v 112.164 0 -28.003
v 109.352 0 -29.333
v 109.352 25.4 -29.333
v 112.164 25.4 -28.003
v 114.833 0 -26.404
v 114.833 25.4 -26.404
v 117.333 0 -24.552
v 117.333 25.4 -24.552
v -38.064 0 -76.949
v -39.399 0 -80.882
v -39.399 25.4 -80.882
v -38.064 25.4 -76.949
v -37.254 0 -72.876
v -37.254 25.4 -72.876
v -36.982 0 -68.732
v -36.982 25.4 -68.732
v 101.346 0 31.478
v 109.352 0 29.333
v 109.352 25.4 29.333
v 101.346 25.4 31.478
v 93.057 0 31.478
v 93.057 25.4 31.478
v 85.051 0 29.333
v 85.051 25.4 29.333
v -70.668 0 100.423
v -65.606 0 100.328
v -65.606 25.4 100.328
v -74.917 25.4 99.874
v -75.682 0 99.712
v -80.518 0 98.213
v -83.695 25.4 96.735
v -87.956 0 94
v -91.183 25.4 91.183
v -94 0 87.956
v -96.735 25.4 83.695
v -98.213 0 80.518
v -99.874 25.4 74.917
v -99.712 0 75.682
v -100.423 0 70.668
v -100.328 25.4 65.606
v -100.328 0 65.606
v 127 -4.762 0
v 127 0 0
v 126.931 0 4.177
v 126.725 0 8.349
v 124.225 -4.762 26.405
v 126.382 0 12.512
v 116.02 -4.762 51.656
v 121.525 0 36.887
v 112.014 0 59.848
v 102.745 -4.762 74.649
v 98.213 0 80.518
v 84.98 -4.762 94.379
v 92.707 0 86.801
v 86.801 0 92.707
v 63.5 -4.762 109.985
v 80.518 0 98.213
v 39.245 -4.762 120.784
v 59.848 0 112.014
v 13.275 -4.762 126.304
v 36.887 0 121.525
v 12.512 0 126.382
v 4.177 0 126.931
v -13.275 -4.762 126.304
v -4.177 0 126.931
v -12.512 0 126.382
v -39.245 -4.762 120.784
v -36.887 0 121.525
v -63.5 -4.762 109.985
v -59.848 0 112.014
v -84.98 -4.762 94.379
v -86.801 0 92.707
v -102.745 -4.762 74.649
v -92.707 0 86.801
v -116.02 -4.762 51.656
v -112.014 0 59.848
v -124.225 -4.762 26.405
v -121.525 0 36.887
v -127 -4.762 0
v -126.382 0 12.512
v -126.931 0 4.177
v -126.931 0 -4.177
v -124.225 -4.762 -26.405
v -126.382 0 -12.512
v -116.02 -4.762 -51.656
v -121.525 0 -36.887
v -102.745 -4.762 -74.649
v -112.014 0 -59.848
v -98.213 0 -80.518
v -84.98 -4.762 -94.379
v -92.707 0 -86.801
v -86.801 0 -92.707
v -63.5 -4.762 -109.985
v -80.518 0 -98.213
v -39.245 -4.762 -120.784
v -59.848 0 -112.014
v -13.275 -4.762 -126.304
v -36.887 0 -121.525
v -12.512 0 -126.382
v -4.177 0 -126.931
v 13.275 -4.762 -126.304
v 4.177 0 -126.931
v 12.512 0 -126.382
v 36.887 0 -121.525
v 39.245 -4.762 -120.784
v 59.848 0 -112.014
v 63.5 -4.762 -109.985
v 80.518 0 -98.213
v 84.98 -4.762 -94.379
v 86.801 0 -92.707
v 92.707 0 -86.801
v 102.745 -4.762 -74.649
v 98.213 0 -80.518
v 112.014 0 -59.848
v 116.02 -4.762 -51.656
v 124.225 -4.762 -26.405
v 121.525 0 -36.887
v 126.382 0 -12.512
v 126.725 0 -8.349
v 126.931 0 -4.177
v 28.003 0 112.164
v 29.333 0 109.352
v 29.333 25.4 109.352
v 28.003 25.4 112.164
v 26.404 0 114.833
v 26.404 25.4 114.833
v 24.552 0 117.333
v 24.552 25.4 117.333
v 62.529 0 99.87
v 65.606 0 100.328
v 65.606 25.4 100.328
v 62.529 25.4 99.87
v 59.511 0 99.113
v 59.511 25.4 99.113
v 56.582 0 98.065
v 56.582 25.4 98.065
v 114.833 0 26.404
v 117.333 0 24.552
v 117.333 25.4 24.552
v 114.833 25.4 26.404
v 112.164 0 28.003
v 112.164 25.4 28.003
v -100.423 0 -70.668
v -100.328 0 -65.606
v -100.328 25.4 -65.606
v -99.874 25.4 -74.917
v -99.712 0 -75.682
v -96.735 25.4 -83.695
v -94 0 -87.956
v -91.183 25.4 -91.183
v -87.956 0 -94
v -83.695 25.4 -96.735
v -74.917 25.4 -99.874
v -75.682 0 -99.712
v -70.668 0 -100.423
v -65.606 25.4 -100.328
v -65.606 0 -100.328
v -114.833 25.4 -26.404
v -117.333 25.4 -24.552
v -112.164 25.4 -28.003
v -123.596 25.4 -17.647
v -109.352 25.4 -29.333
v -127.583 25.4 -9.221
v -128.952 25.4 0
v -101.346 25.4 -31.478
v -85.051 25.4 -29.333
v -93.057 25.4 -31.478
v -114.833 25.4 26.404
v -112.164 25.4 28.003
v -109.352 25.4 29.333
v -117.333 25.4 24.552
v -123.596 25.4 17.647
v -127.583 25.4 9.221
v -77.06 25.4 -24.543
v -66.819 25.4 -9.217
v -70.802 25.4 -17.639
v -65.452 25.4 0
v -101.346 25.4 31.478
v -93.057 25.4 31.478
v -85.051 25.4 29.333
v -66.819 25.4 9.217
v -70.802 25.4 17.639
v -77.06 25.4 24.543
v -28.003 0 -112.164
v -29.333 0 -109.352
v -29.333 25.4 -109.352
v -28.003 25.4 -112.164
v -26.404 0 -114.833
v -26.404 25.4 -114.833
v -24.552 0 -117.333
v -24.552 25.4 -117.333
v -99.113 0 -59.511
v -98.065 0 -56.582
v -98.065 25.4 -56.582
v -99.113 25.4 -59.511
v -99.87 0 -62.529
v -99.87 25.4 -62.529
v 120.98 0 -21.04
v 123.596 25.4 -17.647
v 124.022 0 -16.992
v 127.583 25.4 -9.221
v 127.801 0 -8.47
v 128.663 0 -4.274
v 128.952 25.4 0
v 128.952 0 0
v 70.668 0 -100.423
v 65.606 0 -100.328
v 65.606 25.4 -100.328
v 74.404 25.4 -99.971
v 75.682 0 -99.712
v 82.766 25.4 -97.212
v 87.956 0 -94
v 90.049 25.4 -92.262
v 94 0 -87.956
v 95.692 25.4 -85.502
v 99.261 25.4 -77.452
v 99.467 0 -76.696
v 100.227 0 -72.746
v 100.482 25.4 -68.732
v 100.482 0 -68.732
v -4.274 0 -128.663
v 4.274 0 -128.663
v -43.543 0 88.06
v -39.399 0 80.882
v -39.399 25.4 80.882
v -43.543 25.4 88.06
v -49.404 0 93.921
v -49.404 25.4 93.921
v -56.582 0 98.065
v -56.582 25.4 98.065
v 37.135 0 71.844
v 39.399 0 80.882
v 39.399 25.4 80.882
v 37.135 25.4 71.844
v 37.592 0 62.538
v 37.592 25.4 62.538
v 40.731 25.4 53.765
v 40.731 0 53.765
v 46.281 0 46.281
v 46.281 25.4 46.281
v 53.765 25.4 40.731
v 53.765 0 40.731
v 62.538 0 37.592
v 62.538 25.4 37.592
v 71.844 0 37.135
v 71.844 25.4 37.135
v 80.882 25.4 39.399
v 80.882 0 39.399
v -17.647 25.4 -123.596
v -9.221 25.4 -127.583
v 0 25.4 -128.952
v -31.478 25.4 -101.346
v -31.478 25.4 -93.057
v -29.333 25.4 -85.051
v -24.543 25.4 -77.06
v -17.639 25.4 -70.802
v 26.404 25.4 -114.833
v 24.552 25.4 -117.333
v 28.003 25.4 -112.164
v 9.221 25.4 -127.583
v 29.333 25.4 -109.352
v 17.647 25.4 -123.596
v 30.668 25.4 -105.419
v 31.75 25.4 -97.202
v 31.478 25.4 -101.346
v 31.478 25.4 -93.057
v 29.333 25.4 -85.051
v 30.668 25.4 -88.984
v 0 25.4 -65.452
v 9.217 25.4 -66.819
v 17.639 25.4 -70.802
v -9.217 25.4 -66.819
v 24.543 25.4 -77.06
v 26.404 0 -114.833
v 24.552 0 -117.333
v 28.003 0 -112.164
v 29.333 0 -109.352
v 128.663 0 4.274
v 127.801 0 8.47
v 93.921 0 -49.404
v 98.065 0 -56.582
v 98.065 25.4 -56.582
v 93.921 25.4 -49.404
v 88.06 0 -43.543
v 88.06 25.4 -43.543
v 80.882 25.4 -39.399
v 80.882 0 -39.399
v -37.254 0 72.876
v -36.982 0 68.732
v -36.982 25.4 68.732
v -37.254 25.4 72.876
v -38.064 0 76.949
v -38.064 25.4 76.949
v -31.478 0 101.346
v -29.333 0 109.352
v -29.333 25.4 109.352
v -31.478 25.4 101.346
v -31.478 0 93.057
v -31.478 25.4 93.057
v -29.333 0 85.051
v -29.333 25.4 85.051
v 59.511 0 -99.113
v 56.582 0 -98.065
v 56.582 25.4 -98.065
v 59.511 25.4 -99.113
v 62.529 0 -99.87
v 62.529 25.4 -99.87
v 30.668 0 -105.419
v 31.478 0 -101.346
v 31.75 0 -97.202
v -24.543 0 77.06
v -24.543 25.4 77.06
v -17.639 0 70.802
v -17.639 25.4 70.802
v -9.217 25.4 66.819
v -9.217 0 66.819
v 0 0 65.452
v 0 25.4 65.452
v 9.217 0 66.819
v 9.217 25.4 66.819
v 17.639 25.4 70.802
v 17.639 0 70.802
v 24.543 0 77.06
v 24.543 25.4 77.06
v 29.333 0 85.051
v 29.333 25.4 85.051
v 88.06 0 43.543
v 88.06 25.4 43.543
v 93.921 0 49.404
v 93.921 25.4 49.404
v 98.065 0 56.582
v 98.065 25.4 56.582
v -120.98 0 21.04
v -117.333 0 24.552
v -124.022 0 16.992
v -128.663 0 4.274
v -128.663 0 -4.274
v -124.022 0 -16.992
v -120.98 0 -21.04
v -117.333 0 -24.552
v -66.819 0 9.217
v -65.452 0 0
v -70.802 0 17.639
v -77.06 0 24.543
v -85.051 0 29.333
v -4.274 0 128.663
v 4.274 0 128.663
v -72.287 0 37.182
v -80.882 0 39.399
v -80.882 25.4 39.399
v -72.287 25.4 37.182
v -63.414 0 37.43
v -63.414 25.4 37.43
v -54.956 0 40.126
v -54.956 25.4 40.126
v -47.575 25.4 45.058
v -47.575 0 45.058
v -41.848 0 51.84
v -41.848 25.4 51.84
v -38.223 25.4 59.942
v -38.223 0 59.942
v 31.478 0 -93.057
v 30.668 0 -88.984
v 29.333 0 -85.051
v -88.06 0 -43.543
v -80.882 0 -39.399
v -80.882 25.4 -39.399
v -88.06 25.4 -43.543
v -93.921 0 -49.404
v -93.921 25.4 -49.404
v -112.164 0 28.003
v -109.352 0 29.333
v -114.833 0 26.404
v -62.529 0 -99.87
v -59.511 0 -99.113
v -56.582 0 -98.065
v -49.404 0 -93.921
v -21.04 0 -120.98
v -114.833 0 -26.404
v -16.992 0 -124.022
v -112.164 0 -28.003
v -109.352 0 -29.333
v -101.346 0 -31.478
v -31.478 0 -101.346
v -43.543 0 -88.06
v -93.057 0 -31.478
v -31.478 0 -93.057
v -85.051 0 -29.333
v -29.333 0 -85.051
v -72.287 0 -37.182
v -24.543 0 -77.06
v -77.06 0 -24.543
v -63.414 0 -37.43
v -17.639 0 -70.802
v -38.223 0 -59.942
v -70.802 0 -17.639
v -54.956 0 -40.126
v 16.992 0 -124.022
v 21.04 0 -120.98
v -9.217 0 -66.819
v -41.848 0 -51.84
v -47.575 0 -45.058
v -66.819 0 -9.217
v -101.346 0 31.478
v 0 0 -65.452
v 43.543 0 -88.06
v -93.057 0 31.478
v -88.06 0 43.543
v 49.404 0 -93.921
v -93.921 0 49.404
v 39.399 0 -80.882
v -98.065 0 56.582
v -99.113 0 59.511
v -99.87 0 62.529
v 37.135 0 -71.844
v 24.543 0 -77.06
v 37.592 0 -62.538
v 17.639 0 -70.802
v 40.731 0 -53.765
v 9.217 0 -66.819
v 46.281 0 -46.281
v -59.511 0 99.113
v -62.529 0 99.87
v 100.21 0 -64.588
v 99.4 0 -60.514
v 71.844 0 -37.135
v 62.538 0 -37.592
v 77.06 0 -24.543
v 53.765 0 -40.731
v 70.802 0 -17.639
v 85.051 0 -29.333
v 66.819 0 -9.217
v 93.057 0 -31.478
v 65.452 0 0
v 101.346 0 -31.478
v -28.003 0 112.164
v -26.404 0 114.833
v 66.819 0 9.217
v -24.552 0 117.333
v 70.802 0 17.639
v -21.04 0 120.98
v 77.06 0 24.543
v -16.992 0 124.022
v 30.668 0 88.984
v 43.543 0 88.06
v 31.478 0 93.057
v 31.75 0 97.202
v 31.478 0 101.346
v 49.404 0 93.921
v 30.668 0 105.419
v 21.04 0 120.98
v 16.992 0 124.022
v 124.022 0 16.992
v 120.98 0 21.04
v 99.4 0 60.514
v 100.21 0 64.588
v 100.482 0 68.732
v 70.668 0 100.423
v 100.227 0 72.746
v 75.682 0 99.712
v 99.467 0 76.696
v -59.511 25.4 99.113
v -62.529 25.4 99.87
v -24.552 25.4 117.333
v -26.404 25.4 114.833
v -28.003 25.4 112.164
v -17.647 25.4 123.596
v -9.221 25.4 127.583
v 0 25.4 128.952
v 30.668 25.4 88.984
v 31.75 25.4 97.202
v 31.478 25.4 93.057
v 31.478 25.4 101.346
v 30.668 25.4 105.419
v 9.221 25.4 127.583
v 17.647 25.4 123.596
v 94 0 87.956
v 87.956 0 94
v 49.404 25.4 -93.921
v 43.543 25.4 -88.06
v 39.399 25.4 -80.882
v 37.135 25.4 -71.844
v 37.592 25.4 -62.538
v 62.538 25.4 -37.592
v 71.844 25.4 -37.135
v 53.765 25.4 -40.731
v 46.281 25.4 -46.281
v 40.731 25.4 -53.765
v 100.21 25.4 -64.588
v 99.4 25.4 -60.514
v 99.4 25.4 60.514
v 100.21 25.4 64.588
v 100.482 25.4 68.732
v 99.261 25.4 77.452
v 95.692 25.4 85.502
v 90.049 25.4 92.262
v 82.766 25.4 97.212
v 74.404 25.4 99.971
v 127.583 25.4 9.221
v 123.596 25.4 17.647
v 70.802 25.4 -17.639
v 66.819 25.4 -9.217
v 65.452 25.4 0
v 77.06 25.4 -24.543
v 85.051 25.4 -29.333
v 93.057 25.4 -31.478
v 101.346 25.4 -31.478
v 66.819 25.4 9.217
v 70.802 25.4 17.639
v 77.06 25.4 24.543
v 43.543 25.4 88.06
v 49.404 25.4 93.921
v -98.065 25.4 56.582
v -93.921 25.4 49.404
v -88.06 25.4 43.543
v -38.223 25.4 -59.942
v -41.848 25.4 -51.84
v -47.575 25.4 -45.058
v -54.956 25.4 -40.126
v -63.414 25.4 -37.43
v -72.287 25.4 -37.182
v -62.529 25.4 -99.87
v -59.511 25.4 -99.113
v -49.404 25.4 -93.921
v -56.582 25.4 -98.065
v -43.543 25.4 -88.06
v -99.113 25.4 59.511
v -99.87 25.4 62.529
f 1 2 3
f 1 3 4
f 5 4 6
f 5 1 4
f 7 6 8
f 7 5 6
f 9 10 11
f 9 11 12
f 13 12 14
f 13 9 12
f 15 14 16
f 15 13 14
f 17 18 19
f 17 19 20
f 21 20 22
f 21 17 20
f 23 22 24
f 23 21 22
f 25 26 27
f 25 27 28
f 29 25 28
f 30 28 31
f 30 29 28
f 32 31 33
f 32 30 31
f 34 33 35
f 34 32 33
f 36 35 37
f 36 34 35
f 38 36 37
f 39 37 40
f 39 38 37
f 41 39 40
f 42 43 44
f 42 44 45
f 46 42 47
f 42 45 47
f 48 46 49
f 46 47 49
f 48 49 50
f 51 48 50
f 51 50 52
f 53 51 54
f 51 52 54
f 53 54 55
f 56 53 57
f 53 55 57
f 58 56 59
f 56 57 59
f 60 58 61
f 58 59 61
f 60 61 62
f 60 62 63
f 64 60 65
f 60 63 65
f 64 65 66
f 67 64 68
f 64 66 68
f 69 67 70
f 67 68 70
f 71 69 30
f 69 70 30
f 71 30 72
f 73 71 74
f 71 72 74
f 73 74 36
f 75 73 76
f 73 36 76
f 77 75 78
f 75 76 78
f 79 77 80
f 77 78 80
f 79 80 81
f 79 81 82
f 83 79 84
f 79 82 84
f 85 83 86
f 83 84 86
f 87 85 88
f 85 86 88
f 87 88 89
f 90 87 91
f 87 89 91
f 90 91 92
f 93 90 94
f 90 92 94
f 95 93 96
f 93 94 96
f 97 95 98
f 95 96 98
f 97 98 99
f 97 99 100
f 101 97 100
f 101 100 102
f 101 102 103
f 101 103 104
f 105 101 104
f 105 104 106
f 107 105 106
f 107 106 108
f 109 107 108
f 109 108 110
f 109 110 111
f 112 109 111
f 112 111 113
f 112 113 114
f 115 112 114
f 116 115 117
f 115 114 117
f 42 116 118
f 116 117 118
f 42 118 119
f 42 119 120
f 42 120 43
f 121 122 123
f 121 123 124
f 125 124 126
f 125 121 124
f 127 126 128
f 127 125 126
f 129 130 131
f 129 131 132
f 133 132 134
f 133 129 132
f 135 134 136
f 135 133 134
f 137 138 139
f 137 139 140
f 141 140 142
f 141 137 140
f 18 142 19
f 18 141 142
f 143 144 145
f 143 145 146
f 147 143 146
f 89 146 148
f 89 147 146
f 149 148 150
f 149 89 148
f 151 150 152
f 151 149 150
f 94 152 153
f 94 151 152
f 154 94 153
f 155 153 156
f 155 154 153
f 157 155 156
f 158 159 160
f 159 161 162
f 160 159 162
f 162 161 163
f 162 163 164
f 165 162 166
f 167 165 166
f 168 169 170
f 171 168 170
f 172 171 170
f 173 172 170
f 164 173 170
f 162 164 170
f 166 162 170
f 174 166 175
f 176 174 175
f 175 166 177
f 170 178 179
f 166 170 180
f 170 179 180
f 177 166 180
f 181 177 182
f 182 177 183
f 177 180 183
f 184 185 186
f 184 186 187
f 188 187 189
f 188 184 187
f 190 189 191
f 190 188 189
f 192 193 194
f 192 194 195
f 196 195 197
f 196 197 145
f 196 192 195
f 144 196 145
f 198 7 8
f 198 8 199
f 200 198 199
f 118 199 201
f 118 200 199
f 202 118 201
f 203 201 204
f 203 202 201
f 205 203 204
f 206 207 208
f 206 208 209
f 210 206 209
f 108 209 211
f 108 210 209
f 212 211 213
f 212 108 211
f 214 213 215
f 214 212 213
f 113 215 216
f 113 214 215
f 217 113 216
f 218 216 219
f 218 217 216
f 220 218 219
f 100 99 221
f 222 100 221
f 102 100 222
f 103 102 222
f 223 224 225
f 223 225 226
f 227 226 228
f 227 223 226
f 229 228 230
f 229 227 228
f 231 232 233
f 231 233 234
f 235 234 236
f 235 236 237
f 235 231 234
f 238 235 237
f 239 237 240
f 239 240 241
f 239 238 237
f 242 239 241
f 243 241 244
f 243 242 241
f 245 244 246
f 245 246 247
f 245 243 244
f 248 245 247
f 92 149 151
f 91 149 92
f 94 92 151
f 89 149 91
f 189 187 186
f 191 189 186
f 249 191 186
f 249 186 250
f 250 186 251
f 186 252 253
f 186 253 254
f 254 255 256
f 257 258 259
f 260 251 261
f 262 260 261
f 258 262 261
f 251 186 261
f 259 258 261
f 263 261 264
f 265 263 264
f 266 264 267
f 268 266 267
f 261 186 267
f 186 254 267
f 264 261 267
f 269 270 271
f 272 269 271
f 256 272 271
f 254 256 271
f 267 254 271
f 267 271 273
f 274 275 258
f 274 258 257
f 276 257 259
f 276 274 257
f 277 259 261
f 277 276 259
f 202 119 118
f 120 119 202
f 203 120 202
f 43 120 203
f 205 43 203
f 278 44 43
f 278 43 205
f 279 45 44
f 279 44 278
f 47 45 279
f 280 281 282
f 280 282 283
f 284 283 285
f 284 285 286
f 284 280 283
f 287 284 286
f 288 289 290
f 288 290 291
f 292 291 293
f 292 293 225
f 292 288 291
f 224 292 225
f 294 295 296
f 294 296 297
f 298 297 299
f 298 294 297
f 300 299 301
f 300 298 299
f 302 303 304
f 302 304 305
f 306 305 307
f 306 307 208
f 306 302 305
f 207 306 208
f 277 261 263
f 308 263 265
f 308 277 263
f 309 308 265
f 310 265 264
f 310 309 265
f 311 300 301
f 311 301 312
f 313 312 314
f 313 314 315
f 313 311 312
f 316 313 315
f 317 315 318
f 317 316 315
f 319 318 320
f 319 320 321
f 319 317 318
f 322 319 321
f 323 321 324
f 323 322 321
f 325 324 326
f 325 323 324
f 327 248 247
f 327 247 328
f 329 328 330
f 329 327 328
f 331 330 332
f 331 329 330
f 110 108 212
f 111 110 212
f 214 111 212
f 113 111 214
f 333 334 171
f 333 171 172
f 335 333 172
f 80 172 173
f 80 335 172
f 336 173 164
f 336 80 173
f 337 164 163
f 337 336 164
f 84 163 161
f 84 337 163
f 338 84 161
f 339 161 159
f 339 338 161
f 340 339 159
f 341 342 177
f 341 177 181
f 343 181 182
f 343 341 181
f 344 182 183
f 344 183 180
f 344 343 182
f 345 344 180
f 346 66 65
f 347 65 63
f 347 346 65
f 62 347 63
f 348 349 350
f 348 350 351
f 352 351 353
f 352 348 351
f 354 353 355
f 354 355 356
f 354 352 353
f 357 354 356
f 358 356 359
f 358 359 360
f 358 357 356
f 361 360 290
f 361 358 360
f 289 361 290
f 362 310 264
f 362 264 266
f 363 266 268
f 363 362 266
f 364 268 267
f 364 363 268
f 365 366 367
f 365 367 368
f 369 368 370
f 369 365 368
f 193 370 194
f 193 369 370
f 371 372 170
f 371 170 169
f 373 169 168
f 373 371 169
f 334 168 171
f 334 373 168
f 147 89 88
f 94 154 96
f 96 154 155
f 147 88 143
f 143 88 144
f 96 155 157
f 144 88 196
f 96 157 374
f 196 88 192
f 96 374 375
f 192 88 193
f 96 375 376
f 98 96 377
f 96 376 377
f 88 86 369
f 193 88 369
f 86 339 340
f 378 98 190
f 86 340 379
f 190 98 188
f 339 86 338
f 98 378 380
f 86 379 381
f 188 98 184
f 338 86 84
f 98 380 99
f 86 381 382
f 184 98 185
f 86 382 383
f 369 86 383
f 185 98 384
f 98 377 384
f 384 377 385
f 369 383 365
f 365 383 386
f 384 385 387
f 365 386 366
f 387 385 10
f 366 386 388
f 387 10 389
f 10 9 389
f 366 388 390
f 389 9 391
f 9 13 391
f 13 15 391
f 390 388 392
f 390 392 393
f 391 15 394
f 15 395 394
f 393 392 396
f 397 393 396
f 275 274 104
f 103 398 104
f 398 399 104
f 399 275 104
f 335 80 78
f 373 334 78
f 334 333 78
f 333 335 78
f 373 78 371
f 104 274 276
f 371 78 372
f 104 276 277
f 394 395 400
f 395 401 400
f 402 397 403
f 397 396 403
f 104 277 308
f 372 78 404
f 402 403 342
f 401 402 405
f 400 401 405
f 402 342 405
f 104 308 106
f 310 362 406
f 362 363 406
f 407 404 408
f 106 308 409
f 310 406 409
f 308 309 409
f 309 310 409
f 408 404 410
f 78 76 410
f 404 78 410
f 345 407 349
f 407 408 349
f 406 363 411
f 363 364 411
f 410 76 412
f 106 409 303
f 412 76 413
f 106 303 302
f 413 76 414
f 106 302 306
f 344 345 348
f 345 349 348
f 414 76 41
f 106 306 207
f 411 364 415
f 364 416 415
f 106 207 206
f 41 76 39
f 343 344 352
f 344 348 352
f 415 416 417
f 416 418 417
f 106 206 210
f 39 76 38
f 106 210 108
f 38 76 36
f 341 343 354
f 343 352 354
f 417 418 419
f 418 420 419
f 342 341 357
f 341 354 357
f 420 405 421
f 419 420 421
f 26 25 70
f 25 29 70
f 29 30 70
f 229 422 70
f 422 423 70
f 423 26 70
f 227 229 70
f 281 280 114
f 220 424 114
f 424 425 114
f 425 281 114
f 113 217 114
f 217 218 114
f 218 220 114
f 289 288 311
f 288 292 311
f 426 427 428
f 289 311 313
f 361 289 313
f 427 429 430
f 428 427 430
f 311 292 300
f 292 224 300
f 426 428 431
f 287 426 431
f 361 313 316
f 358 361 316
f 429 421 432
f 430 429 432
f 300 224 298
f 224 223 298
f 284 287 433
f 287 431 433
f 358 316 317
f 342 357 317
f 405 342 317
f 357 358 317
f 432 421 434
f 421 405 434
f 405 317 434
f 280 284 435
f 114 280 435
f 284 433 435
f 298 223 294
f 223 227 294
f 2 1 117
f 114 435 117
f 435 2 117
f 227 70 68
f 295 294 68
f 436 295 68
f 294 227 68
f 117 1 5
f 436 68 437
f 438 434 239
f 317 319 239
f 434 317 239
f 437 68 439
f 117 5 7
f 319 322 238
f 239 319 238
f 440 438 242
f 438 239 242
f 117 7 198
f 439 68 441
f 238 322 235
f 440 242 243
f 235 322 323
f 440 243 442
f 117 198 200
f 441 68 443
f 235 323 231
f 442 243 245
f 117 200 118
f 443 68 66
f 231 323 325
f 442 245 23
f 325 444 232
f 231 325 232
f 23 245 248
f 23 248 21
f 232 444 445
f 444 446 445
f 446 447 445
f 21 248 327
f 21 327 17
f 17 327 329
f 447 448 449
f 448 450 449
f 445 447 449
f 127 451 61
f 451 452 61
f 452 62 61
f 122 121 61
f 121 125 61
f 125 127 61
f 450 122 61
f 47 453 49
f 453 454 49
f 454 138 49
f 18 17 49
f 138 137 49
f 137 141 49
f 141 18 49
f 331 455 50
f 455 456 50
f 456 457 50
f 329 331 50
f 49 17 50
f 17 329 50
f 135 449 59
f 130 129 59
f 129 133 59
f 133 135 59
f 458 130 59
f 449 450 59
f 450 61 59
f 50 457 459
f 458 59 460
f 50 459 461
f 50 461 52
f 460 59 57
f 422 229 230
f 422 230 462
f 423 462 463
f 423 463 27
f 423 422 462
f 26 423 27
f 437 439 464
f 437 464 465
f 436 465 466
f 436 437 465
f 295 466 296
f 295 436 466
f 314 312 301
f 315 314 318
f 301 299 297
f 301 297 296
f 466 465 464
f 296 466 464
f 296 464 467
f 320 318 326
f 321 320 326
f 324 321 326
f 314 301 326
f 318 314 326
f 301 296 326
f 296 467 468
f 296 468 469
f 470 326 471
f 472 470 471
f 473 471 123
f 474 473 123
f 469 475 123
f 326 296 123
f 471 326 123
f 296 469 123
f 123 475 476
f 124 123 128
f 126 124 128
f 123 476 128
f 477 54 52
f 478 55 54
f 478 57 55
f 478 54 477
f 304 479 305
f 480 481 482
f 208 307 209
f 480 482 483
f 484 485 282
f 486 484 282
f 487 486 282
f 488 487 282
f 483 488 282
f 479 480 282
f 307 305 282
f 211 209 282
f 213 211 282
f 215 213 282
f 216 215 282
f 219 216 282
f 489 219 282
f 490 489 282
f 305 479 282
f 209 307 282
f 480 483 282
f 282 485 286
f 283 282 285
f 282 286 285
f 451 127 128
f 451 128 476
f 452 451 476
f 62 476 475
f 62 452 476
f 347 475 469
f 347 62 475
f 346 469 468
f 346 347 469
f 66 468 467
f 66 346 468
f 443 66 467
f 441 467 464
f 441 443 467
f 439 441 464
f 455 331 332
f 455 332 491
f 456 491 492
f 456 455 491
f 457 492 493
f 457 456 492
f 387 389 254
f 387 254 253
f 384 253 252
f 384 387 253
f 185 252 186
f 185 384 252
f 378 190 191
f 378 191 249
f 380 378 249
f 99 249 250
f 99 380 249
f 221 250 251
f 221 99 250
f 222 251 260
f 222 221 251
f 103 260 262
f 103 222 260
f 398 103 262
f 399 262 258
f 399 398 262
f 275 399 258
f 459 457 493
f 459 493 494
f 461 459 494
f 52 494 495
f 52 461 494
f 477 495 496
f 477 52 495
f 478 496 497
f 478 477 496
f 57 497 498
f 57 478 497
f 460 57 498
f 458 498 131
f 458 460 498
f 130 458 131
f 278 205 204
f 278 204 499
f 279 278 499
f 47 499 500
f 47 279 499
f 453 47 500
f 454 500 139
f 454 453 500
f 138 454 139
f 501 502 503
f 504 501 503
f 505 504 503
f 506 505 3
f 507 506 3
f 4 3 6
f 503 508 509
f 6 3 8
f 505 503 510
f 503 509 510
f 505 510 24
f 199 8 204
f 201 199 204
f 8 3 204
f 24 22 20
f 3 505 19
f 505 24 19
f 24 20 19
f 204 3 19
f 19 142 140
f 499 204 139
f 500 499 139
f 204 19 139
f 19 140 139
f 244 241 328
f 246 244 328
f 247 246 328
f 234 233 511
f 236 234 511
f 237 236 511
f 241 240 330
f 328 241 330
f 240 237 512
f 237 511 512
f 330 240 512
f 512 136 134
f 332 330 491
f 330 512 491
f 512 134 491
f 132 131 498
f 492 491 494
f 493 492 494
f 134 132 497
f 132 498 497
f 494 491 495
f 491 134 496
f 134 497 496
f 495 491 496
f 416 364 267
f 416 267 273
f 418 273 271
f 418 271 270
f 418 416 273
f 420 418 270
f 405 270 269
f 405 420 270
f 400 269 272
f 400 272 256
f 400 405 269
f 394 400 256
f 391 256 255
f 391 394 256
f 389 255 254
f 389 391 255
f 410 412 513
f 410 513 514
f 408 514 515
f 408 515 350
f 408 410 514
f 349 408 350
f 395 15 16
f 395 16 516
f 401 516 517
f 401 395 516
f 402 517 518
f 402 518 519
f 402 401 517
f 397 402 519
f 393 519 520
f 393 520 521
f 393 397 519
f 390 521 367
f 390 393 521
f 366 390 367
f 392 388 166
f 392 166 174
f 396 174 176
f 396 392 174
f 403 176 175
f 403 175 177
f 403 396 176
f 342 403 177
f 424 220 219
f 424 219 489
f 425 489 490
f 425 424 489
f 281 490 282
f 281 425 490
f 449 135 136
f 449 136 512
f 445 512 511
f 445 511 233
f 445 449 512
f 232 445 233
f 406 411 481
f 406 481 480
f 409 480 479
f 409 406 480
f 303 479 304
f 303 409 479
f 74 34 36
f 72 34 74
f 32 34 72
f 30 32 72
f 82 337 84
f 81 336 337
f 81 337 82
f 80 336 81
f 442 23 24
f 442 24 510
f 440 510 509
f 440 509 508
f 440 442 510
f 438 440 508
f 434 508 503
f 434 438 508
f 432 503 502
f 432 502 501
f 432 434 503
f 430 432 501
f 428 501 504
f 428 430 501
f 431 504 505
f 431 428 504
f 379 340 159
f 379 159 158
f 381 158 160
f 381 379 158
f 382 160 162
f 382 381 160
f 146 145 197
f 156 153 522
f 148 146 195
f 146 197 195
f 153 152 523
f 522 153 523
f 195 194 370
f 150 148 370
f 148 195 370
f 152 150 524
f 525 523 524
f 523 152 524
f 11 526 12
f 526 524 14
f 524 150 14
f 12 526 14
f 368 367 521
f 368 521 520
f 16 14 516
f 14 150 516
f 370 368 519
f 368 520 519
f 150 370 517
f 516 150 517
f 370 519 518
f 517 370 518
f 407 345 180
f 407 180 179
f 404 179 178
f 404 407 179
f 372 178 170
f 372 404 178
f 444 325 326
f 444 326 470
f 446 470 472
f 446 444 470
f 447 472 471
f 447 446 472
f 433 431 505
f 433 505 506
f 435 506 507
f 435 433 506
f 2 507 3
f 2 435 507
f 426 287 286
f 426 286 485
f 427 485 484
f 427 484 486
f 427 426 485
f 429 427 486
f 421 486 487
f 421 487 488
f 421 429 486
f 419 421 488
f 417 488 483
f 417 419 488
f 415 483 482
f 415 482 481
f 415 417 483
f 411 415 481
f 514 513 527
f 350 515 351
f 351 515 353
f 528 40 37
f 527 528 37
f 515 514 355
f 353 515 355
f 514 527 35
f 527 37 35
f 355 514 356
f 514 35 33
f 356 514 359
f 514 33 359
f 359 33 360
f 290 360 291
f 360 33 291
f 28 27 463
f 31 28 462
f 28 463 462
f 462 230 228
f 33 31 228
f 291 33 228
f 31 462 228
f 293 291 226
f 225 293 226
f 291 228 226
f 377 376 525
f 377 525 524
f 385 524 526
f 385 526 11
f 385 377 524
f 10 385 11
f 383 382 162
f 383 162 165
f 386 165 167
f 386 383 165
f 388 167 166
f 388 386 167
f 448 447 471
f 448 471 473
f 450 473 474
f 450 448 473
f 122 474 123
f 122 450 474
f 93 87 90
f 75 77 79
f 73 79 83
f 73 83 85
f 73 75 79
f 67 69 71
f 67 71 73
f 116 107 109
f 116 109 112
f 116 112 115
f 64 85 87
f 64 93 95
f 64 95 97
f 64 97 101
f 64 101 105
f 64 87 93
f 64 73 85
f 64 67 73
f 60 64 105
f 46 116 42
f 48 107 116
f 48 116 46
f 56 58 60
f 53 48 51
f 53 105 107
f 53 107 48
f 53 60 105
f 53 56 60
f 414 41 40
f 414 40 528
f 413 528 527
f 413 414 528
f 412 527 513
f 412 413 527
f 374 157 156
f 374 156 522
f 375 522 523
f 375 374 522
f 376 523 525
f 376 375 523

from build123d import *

# Parameters (mm, degrees)
F0_R     = 127
F1_DEPTH = 4.7625
F3_DEPTH = 25.4


with BuildPart() as f1:
    # F0 (on Front) → F1 (new body)
    with BuildSketch(Plane.XZ):
        Circle(F0_R)
    extrude(amount=F1_DEPTH)

    # F2 (on Front) → F3 (join)
    with BuildSketch(Plane.XZ):
        with BuildLine():
            ThreePointArc((-36.9819047186, -68.7319047186), (-51.0925498202, -42.332744528), (-80.8821036962, -39.3987295613))
            Line((-80.8821036962, -39.3987295613), (-68.7319047186, -68.7319047186))
            Line((-68.7319047186, -68.7319047186), (-39.3987295613, -80.8821036962))
            ThreePointArc((-39.3987295613, -80.8821036962), (-37.5919720658, -74.9260224426), (-36.9819047186, -68.7319047186))
        make_face()
        with BuildLine():
            Line((-39.3987295613, -80.8821036962), (-68.7319047186, -68.7319047186))
            Line((-68.7319047186, -68.7319047186), (-56.581705741, -98.0650798758))
            ThreePointArc((-56.581705741, -98.0650798758), (-46.2812644159, -91.1825450212), (-39.3987295613, -80.8821036962))
        make_face()
        with BuildLine():
            ThreePointArc((-80.8821036962, -39.3987295613), (-91.1825450212, -46.2812644159), (-98.0650798758, -56.581705741))
            Line((-98.0650798758, -56.581705741), (-68.7319047186, -68.7319047186))
            Line((-68.7319047186, -68.7319047186), (-80.8821036962, -39.3987295613))
        make_face()
        with BuildLine():
            ThreePointArc((-98.0650798758, -56.581705741), (-99.5286869284, -61.0104601958), (-100.3276376212, -65.6058589181))
            Line((-100.3276376212, -65.6058589181), (-65.6058589181, -100.3276376212))
            ThreePointArc((-65.6058589181, -100.3276376212), (-61.0104601958, -99.5286869284), (-56.581705741, -98.0650798758))
            Line((-56.581705741, -98.0650798758), (-68.7319047186, -68.7319047186))
            Line((-68.7319047186, -68.7319047186), (-98.0650798758, -56.581705741))
        make_face()
        with BuildLine():
            Line((-65.6058589181, -100.3276376212), (-100.3276376212, -65.6058589181))
            ThreePointArc((-100.3276376212, -65.6058589181), (-91.1825450212, -91.1825450212), (-65.6058589181, -100.3276376212))
        make_face()
        with BuildLine():
            Line((-85.0513928431, -29.3331751572), (-97.2015918207, 0))
            Line((-97.2015918207, 0), (-109.3517907983, -29.3331751572))
            ThreePointArc((-109.3517907983, -29.3331751572), (-97.2015918207, -31.75), (-85.0513928431, -29.3331751572))
        make_face()
        with BuildLine():
            Line((-85.0513928431, 29.3331751572), (-97.2015918207, 0))
            Line((-97.2015918207, 0), (-85.0513928431, -29.3331751572))
            ThreePointArc((-85.0513928431, -29.3331751572), (-70.8024316301, -17.6393548984), (-65.4515918207, 0))
            ThreePointArc((-65.4515918207, 0), (-70.8024316301, 17.6393548984), (-85.0513928431, 29.3331751572))
        make_face()
        with BuildLine():
            ThreePointArc((-85.0513928431, 29.3331751572), (-97.2015918207, 31.75), (-109.3517907983, 29.3331751572))
            Line((-109.3517907983, 29.3331751572), (-97.2015918207, 0))
            Line((-97.2015918207, 0), (-85.0513928431, 29.3331751572))
        make_face()
        with BuildLine():
            ThreePointArc((-109.3517907983, 29.3331751572), (-113.5183195775, 27.2364993219), (-117.3327006289, 24.5520051758))
            Line((-117.3327006289, 24.5520051758), (-117.3327006289, -24.5520051758))
            ThreePointArc((-117.3327006289, -24.5520051758), (-113.5183195775, -27.2364993219), (-109.3517907983, -29.3331751572))
            Line((-109.3517907983, -29.3331751572), (-97.2015918207, 0))
            Line((-97.2015918207, 0), (-109.3517907983, 29.3331751572))
        make_face()
        with BuildLine():
            Line((-117.3327006289, -24.5520051758), (-117.3327006289, 24.5520051758))
            ThreePointArc((-117.3327006289, 24.5520051758), (-128.9515918207, 0), (-117.3327006289, -24.5520051758))
        make_face()
        with BuildLine():
            Line((-68.7319047186, 68.7319047186), (-98.0650798758, 56.581705741))
            ThreePointArc((-98.0650798758, 56.581705741), (-91.1825450212, 46.2812644159), (-80.8821036962, 39.3987295613))
            Line((-80.8821036962, 39.3987295613), (-68.7319047186, 68.7319047186))
        make_face()
        with BuildLine():
            Line((-39.3987295613, 80.8821036962), (-68.7319047186, 68.7319047186))
            Line((-68.7319047186, 68.7319047186), (-80.8821036962, 39.3987295613))
            ThreePointArc((-80.8821036962, 39.3987295613), (-51.0925498202, 42.332744528), (-36.9819047186, 68.7319047186))
            ThreePointArc((-36.9819047186, 68.7319047186), (-37.5919720658, 74.9260224426), (-39.3987295613, 80.8821036962))
        make_face()
        with BuildLine():
            Line((-56.581705741, 98.0650798758), (-68.7319047186, 68.7319047186))
            Line((-68.7319047186, 68.7319047186), (-39.3987295613, 80.8821036962))
            ThreePointArc((-39.3987295613, 80.8821036962), (-46.2812644159, 91.1825450212), (-56.581705741, 98.0650798758))
        make_face()
        with BuildLine():
            Line((-65.6058589181, 100.3276376212), (-100.3276376212, 65.6058589181))
            ThreePointArc((-100.3276376212, 65.6058589181), (-99.5286869284, 61.0104601958), (-98.0650798758, 56.581705741))
            Line((-98.0650798758, 56.581705741), (-68.7319047186, 68.7319047186))
            Line((-68.7319047186, 68.7319047186), (-56.581705741, 98.0650798758))
            ThreePointArc((-56.581705741, 98.0650798758), (-61.0104601958, 99.5286869284), (-65.6058589181, 100.3276376212))
        make_face()
        with BuildLine():
            ThreePointArc((-65.6058589181, 100.3276376212), (-91.1825450212, 91.1825450212), (-100.3276376212, 65.6058589181))
            Line((-100.3276376212, 65.6058589181), (-65.6058589181, 100.3276376212))
        make_face()
        with BuildLine():
            Line((0, 97.2015918207), (-29.3331751572, 85.0513928431))
            ThreePointArc((-29.3331751572, 85.0513928431), (0, 65.4515918207), (29.3331751572, 85.0513928431))
            Line((29.3331751572, 85.0513928431), (0, 97.2015918207))
        make_face()
        with BuildLine():
            Line((0, 97.2015918207), (-29.3331751572, 109.3517907983))
            ThreePointArc((-29.3331751572, 109.3517907983), (-31.75, 97.2015918207), (-29.3331751572, 85.0513928431))
            Line((-29.3331751572, 85.0513928431), (0, 97.2015918207))
        make_face()
        with BuildLine():
            Line((29.3331751572, 109.3517907983), (0, 97.2015918207))
            Line((0, 97.2015918207), (29.3331751572, 85.0513928431))
            ThreePointArc((29.3331751572, 85.0513928431), (31.1399326528, 91.0074740967), (31.75, 97.2015918207))
            ThreePointArc((31.75, 97.2015918207), (31.1399326528, 103.3957095447), (29.3331751572, 109.3517907983))
        make_face()
        with BuildLine():
            Line((24.5520051758, 117.3327006289), (-24.5520051758, 117.3327006289))
            ThreePointArc((-24.5520051758, 117.3327006289), (-27.2364993219, 113.5183195775), (-29.3331751572, 109.3517907983))
            Line((-29.3331751572, 109.3517907983), (0, 97.2015918207))
            Line((0, 97.2015918207), (29.3331751572, 109.3517907983))
            ThreePointArc((29.3331751572, 109.3517907983), (27.2364993219, 113.5183195775), (24.5520051758, 117.3327006289))
        make_face()
        with BuildLine():
            ThreePointArc((24.5520051758, 117.3327006289), (0, 128.9515918207), (-24.5520051758, 117.3327006289))
            Line((-24.5520051758, 117.3327006289), (24.5520051758, 117.3327006289))
        make_face()
        with BuildLine():
            Line((68.7319047186, 68.7319047186), (39.3987295613, 80.8821036962))
            ThreePointArc((39.3987295613, 80.8821036962), (46.2812644159, 46.2812644159), (80.8821036962, 39.3987295613))
            Line((80.8821036962, 39.3987295613), (68.7319047186, 68.7319047186))
        make_face()
        with BuildLine():
            ThreePointArc((56.581705741, 98.0650798758), (46.2812644159, 91.1825450212), (39.3987295613, 80.8821036962))
            Line((39.3987295613, 80.8821036962), (68.7319047186, 68.7319047186))
            Line((68.7319047186, 68.7319047186), (56.581705741, 98.0650798758))
        make_face()
        with BuildLine():
            Line((100.3276376212, 65.6058589181), (65.6058589181, 100.3276376212))
            ThreePointArc((65.6058589181, 100.3276376212), (61.0104601958, 99.5286869284), (56.581705741, 98.0650798758))
            Line((56.581705741, 98.0650798758), (68.7319047186, 68.7319047186))
            Line((68.7319047186, 68.7319047186), (98.0650798758, 56.581705741))
            ThreePointArc((98.0650798758, 56.581705741), (99.5286869284, 61.0104601958), (100.3276376212, 65.6058589181))
        make_face()
        with BuildLine():
            Line((98.0650798758, 56.581705741), (68.7319047186, 68.7319047186))
            Line((68.7319047186, 68.7319047186), (80.8821036962, 39.3987295613))
            ThreePointArc((80.8821036962, 39.3987295613), (91.1825450212, 46.2812644159), (98.0650798758, 56.581705741))
        make_face()
        with BuildLine():
            ThreePointArc((100.4819047186, 68.7319047186), (90.04868855, 92.2618266709), (65.6058589181, 100.3276376212))
            Line((65.6058589181, 100.3276376212), (100.3276376212, 65.6058589181))
            ThreePointArc((100.3276376212, 65.6058589181), (100.4433144922, 67.1669797456), (100.4819047186, 68.7319047186))
        make_face()
        with BuildLine():
            Line((97.2015918207, 0), (85.0513928431, 29.3331751572))
            ThreePointArc((85.0513928431, 29.3331751572), (65.4515918207, 0), (85.0513928431, -29.3331751572))
            Line((85.0513928431, -29.3331751572), (97.2015918207, 0))
        make_face()
        with BuildLine():
            Line((109.3517907983, 29.3331751572), (97.2015918207, 0))
            Line((97.2015918207, 0), (109.3517907983, -29.3331751572))
            ThreePointArc((109.3517907983, -29.3331751572), (113.5183195775, -27.2364993219), (117.3327006289, -24.5520051758))
            Line((117.3327006289, -24.5520051758), (117.3327006289, 24.5520051758))
            ThreePointArc((117.3327006289, 24.5520051758), (113.5183195775, 27.2364993219), (109.3517907983, 29.3331751572))
        make_face()
        with BuildLine():
            ThreePointArc((109.3517907983, 29.3331751572), (97.2015918207, 31.75), (85.0513928431, 29.3331751572))
            Line((85.0513928431, 29.3331751572), (97.2015918207, 0))
            Line((97.2015918207, 0), (109.3517907983, 29.3331751572))
        make_face()
        with BuildLine():
            Line((109.3517907983, -29.3331751572), (97.2015918207, 0))
            Line((97.2015918207, 0), (85.0513928431, -29.3331751572))
            ThreePointArc((85.0513928431, -29.3331751572), (97.2015918207, -31.75), (109.3517907983, -29.3331751572))
        make_face()
        with BuildLine():
            ThreePointArc((128.9515918207, 0), (125.9002433976, 13.5812332897), (117.3327006289, 24.5520051758))
            Line((117.3327006289, 24.5520051758), (117.3327006289, -24.5520051758))
            ThreePointArc((117.3327006289, -24.5520051758), (125.9002433976, -13.5812332897), (128.9515918207, 0))
        make_face()
        with BuildLine():
            Line((80.8821036962, -39.3987295613), (68.7319047186, -68.7319047186))
            Line((68.7319047186, -68.7319047186), (98.0650798758, -56.581705741))
            ThreePointArc((98.0650798758, -56.581705741), (91.1825450212, -46.2812644159), (80.8821036962, -39.3987295613))
        make_face()
        with BuildLine():
            ThreePointArc((80.8821036962, -39.3987295613), (46.2812644159, -46.2812644159), (39.3987295613, -80.8821036962))
            Line((39.3987295613, -80.8821036962), (68.7319047186, -68.7319047186))
            Line((68.7319047186, -68.7319047186), (80.8821036962, -39.3987295613))
        make_face()
        with BuildLine():
            Line((68.7319047186, -68.7319047186), (39.3987295613, -80.8821036962))
            ThreePointArc((39.3987295613, -80.8821036962), (46.2812644159, -91.1825450212), (56.581705741, -98.0650798758))
            Line((56.581705741, -98.0650798758), (68.7319047186, -68.7319047186))
        make_face()
        with BuildLine():
            ThreePointArc((56.581705741, -98.0650798758), (61.0104601958, -99.5286869284), (65.6058589181, -100.3276376212))
            Line((65.6058589181, -100.3276376212), (100.3276376212, -65.6058589181))
            ThreePointArc((100.3276376212, -65.6058589181), (99.5286869284, -61.0104601958), (98.0650798758, -56.581705741))
            Line((98.0650798758, -56.581705741), (68.7319047186, -68.7319047186))
            Line((68.7319047186, -68.7319047186), (56.581705741, -98.0650798758))
        make_face()
        with BuildLine():
            Line((100.3276376212, -65.6058589181), (65.6058589181, -100.3276376212))
            ThreePointArc((65.6058589181, -100.3276376212), (90.04868855, -92.2618266709), (100.4819047186, -68.7319047186))
            ThreePointArc((100.4819047186, -68.7319047186), (100.4433144922, -67.1669797456), (100.3276376212, -65.6058589181))
        make_face()
        with BuildLine():
            ThreePointArc((29.3331751572, -85.0513928431), (0, -65.4515918207), (-29.3331751572, -85.0513928431))
            Line((-29.3331751572, -85.0513928431), (0, -97.2015918207))
            Line((0, -97.2015918207), (29.3331751572, -85.0513928431))
        make_face()
        with BuildLine():
            Line((29.3331751572, -85.0513928431), (0, -97.2015918207))
            Line((0, -97.2015918207), (29.3331751572, -109.3517907983))
            ThreePointArc((29.3331751572, -109.3517907983), (31.1399326528, -103.3957095447), (31.75, -97.2015918207))
            ThreePointArc((31.75, -97.2015918207), (31.1399326528, -91.0074740967), (29.3331751572, -85.0513928431))
        make_face()
        with BuildLine():
            ThreePointArc((-29.3331751572, -85.0513928431), (-31.75, -97.2015918207), (-29.3331751572, -109.3517907983))
            Line((-29.3331751572, -109.3517907983), (0, -97.2015918207))
            Line((0, -97.2015918207), (-29.3331751572, -85.0513928431))
        make_face()
        with BuildLine():
            ThreePointArc((-29.3331751572, -109.3517907983), (-27.2364993219, -113.5183195775), (-24.5520051758, -117.3327006289))
            Line((-24.5520051758, -117.3327006289), (24.5520051758, -117.3327006289))
            ThreePointArc((24.5520051758, -117.3327006289), (27.2364993219, -113.5183195775), (29.3331751572, -109.3517907983))
            Line((29.3331751572, -109.3517907983), (0, -97.2015918207))
            Line((0, -97.2015918207), (-29.3331751572, -109.3517907983))
        make_face()
        with BuildLine():
            Line((24.5520051758, -117.3327006289), (-24.5520051758, -117.3327006289))
            ThreePointArc((-24.5520051758, -117.3327006289), (0, -128.9515918207), (24.5520051758, -117.3327006289))
        make_face()
    extrude(amount=-F3_DEPTH)


solid = f1.part
